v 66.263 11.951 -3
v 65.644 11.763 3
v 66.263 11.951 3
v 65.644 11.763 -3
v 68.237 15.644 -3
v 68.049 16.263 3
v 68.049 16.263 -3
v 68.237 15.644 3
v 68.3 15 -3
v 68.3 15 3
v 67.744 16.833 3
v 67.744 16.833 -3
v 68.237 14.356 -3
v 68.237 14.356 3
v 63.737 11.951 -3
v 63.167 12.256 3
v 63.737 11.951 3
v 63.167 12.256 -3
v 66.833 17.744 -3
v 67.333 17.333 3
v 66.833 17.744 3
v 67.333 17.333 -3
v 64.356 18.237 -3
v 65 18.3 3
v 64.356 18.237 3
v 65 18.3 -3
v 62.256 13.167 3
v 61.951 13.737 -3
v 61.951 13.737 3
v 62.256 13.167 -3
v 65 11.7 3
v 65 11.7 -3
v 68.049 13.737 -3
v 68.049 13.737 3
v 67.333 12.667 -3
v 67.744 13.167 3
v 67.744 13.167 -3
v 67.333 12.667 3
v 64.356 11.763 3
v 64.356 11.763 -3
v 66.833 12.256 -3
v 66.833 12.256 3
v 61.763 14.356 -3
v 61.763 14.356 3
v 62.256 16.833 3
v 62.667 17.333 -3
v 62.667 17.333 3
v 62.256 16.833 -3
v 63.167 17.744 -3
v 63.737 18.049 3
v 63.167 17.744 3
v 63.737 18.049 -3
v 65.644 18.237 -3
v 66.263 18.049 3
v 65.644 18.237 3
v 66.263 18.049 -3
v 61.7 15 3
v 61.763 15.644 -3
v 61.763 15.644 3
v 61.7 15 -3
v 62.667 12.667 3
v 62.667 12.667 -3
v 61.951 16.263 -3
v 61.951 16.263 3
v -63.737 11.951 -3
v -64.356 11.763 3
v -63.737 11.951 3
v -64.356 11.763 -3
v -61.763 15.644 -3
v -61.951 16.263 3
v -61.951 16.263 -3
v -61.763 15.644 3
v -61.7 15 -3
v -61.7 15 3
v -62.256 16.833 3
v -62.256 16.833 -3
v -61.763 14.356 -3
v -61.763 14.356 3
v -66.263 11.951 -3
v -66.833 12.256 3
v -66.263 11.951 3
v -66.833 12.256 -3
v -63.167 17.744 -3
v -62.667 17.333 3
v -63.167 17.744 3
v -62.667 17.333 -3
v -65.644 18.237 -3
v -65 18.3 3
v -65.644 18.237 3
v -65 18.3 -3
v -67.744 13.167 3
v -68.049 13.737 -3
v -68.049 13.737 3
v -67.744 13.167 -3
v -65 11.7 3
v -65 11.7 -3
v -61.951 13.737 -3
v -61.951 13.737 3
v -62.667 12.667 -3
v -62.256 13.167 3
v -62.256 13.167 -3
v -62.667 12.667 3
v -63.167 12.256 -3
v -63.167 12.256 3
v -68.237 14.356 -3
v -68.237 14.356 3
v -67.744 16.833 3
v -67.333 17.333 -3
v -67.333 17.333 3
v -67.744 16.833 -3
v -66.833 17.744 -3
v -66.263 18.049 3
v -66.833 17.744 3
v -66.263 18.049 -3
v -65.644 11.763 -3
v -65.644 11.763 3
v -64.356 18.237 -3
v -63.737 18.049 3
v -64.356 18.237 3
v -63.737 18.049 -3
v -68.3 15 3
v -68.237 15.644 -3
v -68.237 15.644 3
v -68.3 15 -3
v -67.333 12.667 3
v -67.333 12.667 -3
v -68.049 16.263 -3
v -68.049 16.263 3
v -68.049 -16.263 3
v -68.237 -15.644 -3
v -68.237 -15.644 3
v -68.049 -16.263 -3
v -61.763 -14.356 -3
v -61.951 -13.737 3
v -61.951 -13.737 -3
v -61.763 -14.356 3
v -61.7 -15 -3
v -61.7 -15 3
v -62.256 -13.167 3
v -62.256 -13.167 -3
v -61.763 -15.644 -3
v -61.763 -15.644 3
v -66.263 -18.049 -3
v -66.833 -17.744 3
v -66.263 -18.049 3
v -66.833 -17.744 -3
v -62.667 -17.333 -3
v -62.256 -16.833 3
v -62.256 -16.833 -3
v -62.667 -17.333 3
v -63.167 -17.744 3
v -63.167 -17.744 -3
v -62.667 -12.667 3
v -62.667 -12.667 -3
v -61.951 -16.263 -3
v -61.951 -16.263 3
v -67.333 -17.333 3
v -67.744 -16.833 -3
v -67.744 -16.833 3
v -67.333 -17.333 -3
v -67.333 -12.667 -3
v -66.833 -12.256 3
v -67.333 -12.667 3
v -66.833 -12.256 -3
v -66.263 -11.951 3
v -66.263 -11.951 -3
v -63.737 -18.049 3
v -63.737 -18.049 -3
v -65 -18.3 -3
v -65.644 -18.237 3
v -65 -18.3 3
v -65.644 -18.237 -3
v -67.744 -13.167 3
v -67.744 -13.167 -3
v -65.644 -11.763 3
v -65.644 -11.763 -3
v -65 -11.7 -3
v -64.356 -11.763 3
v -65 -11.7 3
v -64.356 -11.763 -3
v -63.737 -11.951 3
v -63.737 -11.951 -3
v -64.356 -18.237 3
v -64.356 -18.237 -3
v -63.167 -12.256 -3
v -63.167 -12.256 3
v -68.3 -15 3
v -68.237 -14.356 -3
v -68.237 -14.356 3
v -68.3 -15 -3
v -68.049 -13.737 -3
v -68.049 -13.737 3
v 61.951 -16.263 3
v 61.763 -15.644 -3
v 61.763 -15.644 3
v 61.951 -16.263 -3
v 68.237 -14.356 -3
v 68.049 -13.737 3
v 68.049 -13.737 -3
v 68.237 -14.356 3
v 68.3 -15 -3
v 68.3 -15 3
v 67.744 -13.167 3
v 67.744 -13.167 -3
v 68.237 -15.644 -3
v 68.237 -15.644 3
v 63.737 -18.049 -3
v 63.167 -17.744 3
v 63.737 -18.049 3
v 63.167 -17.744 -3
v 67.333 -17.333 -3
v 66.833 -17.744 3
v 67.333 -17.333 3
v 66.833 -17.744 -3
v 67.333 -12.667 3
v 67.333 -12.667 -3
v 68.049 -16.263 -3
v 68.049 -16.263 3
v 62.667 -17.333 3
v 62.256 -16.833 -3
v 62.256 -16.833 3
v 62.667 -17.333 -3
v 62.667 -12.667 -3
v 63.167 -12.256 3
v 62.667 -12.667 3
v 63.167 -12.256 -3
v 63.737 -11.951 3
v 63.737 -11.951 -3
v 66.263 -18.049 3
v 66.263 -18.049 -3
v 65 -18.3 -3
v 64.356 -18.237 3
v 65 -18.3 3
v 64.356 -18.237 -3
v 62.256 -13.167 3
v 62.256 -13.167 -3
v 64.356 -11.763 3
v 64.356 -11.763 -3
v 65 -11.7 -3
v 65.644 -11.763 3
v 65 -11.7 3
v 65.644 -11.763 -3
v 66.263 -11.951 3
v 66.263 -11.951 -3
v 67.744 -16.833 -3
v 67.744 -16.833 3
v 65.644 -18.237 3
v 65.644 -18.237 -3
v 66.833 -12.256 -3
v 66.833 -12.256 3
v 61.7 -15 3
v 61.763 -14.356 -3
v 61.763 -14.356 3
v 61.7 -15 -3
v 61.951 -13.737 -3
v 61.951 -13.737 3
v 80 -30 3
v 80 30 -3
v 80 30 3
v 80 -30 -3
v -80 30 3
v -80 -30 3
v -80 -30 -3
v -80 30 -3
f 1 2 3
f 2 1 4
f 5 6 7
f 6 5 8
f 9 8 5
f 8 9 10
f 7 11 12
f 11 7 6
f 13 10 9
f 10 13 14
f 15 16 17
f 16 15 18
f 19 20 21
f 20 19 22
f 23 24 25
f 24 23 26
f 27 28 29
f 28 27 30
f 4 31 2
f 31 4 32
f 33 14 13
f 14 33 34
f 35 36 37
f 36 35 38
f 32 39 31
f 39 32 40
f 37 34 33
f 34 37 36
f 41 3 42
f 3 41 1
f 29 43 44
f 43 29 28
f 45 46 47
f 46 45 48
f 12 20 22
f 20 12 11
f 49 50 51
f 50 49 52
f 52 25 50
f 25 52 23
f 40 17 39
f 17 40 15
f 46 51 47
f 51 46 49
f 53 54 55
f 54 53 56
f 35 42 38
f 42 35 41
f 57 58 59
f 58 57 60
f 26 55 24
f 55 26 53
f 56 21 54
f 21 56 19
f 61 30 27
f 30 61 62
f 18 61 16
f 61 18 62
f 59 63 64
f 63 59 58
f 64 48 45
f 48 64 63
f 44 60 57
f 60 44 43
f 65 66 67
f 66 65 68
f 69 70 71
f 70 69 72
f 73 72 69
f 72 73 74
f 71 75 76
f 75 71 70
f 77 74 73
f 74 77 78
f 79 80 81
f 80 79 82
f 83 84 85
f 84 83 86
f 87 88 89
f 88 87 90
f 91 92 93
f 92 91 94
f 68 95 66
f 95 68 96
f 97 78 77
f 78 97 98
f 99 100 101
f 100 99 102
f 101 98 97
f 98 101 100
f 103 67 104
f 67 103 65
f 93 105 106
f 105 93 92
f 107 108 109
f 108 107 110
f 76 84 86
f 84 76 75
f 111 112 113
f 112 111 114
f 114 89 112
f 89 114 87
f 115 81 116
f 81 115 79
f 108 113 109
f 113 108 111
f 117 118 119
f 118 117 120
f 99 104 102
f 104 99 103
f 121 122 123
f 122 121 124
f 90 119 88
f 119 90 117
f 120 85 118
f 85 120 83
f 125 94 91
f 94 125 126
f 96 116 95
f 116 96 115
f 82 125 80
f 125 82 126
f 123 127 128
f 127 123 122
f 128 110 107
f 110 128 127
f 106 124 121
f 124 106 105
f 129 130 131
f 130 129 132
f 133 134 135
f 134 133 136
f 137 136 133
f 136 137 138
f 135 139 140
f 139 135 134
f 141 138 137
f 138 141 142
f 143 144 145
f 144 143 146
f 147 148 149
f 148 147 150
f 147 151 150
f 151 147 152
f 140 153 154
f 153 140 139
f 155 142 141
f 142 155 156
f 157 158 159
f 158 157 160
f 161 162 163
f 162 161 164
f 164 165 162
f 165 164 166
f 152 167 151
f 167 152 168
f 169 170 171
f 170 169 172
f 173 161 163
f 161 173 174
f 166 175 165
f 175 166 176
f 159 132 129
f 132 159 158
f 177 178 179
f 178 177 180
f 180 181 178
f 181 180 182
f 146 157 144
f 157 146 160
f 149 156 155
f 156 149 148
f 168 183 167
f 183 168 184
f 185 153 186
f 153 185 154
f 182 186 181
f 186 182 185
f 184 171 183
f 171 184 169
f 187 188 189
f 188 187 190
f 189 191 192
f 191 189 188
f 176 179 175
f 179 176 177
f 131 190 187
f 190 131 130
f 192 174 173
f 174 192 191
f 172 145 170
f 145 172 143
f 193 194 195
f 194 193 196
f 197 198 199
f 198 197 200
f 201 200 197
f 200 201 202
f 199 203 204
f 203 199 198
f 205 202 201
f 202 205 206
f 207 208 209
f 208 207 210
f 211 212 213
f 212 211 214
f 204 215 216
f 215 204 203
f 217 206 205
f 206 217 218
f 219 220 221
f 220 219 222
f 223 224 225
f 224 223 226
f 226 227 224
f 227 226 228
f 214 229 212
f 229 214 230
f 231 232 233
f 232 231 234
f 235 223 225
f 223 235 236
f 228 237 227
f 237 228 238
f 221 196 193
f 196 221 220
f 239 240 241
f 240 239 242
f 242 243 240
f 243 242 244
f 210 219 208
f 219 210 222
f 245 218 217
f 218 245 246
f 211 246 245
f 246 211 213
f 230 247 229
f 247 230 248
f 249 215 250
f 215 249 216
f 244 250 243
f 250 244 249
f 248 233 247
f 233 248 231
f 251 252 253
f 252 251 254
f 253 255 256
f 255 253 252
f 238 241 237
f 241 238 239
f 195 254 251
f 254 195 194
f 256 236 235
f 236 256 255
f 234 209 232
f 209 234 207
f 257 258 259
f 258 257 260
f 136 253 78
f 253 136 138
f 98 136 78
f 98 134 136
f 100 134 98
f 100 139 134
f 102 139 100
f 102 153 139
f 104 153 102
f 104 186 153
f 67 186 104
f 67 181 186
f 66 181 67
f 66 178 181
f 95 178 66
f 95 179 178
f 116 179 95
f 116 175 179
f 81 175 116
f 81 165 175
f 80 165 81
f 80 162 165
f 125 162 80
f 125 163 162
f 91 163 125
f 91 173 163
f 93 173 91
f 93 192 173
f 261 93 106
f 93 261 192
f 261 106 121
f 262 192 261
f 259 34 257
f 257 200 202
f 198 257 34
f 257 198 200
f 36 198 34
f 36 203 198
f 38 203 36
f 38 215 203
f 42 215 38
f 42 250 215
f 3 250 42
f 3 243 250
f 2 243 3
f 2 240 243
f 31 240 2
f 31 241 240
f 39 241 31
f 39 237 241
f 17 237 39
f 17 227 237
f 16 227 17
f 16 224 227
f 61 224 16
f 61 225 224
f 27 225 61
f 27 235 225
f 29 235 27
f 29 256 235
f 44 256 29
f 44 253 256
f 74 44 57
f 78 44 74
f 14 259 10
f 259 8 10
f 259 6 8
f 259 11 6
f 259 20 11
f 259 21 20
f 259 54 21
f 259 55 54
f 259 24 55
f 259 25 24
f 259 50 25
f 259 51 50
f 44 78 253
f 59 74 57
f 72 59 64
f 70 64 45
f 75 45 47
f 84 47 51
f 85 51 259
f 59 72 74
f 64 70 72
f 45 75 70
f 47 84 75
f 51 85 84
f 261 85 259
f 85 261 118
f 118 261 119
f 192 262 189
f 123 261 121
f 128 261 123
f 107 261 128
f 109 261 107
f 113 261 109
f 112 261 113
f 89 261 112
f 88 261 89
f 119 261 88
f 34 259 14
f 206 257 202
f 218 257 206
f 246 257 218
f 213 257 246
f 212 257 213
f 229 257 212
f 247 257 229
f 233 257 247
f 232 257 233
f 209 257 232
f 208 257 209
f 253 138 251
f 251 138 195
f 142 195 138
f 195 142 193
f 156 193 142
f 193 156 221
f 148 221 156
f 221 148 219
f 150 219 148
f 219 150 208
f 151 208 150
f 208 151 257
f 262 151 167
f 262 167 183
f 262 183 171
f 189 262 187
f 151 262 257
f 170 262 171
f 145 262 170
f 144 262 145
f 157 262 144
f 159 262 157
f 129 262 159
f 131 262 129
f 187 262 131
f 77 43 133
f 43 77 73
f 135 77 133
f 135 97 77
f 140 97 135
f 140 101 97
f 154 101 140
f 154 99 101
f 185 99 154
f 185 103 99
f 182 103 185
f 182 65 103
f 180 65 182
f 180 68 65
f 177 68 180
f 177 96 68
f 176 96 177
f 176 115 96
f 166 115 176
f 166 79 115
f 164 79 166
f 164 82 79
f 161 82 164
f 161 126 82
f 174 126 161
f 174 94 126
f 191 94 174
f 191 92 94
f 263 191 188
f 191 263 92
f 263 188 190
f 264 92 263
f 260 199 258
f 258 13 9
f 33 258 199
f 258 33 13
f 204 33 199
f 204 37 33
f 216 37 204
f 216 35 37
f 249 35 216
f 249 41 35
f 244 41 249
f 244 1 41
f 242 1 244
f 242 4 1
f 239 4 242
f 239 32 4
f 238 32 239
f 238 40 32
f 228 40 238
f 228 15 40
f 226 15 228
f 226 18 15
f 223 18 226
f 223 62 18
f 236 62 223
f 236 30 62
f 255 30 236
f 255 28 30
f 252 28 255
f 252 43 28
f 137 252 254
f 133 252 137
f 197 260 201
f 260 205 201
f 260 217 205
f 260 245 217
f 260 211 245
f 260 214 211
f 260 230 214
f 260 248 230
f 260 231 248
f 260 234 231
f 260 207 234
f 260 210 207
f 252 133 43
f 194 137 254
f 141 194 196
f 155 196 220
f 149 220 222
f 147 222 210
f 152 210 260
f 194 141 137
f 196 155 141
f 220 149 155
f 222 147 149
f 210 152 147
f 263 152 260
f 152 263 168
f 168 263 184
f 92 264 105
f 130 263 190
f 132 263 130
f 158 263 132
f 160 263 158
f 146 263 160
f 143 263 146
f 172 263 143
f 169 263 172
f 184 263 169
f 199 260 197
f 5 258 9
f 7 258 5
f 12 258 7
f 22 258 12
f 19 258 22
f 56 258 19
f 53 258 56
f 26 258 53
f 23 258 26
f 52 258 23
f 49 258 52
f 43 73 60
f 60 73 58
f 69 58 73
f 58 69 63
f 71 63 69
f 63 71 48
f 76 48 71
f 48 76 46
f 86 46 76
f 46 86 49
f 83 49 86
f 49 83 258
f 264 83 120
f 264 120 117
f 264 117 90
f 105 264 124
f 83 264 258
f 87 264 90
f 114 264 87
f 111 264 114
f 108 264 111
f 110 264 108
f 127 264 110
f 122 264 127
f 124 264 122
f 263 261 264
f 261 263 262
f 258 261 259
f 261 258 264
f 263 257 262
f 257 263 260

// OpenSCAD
$fn = 32;

// ----------------------------------------------------------------------
// Corner plate 160 x 60 x 6
// 4 holes, centres taken from the edge offset
// ----------------------------------------------------------------------

// --- parameters (mm) ---
plate = [160, 60, 6];  // overall size (x, y, z)
holes = 4;             // number of holes the drawing asks for
hole_d = 6.6;          // hole diameter
edge = 15;             // hole centre offset from the plate edge

// --- derived feature positions (mm) ---
corner_x = plate[0] / 2 - edge;  // = 65   corner hole X
corner_y = plate[1] / 2 - edge;  // = 15   corner hole Y
feature_centers = [
  [corner_x, corner_y],
  [-corner_x, corner_y],
  [-corner_x, -corner_y],
  [corner_x, -corner_y]
];   // hole centres the loop below drills

// plate outline, every hole drilled through with the same cutters
difference() {
  cube(plate, center = true);
  for (centre = feature_centers)
    translate([centre[0], centre[1], 0])
      cylinder(d = hole_d, h = plate[2] + 2, center = true);
}
